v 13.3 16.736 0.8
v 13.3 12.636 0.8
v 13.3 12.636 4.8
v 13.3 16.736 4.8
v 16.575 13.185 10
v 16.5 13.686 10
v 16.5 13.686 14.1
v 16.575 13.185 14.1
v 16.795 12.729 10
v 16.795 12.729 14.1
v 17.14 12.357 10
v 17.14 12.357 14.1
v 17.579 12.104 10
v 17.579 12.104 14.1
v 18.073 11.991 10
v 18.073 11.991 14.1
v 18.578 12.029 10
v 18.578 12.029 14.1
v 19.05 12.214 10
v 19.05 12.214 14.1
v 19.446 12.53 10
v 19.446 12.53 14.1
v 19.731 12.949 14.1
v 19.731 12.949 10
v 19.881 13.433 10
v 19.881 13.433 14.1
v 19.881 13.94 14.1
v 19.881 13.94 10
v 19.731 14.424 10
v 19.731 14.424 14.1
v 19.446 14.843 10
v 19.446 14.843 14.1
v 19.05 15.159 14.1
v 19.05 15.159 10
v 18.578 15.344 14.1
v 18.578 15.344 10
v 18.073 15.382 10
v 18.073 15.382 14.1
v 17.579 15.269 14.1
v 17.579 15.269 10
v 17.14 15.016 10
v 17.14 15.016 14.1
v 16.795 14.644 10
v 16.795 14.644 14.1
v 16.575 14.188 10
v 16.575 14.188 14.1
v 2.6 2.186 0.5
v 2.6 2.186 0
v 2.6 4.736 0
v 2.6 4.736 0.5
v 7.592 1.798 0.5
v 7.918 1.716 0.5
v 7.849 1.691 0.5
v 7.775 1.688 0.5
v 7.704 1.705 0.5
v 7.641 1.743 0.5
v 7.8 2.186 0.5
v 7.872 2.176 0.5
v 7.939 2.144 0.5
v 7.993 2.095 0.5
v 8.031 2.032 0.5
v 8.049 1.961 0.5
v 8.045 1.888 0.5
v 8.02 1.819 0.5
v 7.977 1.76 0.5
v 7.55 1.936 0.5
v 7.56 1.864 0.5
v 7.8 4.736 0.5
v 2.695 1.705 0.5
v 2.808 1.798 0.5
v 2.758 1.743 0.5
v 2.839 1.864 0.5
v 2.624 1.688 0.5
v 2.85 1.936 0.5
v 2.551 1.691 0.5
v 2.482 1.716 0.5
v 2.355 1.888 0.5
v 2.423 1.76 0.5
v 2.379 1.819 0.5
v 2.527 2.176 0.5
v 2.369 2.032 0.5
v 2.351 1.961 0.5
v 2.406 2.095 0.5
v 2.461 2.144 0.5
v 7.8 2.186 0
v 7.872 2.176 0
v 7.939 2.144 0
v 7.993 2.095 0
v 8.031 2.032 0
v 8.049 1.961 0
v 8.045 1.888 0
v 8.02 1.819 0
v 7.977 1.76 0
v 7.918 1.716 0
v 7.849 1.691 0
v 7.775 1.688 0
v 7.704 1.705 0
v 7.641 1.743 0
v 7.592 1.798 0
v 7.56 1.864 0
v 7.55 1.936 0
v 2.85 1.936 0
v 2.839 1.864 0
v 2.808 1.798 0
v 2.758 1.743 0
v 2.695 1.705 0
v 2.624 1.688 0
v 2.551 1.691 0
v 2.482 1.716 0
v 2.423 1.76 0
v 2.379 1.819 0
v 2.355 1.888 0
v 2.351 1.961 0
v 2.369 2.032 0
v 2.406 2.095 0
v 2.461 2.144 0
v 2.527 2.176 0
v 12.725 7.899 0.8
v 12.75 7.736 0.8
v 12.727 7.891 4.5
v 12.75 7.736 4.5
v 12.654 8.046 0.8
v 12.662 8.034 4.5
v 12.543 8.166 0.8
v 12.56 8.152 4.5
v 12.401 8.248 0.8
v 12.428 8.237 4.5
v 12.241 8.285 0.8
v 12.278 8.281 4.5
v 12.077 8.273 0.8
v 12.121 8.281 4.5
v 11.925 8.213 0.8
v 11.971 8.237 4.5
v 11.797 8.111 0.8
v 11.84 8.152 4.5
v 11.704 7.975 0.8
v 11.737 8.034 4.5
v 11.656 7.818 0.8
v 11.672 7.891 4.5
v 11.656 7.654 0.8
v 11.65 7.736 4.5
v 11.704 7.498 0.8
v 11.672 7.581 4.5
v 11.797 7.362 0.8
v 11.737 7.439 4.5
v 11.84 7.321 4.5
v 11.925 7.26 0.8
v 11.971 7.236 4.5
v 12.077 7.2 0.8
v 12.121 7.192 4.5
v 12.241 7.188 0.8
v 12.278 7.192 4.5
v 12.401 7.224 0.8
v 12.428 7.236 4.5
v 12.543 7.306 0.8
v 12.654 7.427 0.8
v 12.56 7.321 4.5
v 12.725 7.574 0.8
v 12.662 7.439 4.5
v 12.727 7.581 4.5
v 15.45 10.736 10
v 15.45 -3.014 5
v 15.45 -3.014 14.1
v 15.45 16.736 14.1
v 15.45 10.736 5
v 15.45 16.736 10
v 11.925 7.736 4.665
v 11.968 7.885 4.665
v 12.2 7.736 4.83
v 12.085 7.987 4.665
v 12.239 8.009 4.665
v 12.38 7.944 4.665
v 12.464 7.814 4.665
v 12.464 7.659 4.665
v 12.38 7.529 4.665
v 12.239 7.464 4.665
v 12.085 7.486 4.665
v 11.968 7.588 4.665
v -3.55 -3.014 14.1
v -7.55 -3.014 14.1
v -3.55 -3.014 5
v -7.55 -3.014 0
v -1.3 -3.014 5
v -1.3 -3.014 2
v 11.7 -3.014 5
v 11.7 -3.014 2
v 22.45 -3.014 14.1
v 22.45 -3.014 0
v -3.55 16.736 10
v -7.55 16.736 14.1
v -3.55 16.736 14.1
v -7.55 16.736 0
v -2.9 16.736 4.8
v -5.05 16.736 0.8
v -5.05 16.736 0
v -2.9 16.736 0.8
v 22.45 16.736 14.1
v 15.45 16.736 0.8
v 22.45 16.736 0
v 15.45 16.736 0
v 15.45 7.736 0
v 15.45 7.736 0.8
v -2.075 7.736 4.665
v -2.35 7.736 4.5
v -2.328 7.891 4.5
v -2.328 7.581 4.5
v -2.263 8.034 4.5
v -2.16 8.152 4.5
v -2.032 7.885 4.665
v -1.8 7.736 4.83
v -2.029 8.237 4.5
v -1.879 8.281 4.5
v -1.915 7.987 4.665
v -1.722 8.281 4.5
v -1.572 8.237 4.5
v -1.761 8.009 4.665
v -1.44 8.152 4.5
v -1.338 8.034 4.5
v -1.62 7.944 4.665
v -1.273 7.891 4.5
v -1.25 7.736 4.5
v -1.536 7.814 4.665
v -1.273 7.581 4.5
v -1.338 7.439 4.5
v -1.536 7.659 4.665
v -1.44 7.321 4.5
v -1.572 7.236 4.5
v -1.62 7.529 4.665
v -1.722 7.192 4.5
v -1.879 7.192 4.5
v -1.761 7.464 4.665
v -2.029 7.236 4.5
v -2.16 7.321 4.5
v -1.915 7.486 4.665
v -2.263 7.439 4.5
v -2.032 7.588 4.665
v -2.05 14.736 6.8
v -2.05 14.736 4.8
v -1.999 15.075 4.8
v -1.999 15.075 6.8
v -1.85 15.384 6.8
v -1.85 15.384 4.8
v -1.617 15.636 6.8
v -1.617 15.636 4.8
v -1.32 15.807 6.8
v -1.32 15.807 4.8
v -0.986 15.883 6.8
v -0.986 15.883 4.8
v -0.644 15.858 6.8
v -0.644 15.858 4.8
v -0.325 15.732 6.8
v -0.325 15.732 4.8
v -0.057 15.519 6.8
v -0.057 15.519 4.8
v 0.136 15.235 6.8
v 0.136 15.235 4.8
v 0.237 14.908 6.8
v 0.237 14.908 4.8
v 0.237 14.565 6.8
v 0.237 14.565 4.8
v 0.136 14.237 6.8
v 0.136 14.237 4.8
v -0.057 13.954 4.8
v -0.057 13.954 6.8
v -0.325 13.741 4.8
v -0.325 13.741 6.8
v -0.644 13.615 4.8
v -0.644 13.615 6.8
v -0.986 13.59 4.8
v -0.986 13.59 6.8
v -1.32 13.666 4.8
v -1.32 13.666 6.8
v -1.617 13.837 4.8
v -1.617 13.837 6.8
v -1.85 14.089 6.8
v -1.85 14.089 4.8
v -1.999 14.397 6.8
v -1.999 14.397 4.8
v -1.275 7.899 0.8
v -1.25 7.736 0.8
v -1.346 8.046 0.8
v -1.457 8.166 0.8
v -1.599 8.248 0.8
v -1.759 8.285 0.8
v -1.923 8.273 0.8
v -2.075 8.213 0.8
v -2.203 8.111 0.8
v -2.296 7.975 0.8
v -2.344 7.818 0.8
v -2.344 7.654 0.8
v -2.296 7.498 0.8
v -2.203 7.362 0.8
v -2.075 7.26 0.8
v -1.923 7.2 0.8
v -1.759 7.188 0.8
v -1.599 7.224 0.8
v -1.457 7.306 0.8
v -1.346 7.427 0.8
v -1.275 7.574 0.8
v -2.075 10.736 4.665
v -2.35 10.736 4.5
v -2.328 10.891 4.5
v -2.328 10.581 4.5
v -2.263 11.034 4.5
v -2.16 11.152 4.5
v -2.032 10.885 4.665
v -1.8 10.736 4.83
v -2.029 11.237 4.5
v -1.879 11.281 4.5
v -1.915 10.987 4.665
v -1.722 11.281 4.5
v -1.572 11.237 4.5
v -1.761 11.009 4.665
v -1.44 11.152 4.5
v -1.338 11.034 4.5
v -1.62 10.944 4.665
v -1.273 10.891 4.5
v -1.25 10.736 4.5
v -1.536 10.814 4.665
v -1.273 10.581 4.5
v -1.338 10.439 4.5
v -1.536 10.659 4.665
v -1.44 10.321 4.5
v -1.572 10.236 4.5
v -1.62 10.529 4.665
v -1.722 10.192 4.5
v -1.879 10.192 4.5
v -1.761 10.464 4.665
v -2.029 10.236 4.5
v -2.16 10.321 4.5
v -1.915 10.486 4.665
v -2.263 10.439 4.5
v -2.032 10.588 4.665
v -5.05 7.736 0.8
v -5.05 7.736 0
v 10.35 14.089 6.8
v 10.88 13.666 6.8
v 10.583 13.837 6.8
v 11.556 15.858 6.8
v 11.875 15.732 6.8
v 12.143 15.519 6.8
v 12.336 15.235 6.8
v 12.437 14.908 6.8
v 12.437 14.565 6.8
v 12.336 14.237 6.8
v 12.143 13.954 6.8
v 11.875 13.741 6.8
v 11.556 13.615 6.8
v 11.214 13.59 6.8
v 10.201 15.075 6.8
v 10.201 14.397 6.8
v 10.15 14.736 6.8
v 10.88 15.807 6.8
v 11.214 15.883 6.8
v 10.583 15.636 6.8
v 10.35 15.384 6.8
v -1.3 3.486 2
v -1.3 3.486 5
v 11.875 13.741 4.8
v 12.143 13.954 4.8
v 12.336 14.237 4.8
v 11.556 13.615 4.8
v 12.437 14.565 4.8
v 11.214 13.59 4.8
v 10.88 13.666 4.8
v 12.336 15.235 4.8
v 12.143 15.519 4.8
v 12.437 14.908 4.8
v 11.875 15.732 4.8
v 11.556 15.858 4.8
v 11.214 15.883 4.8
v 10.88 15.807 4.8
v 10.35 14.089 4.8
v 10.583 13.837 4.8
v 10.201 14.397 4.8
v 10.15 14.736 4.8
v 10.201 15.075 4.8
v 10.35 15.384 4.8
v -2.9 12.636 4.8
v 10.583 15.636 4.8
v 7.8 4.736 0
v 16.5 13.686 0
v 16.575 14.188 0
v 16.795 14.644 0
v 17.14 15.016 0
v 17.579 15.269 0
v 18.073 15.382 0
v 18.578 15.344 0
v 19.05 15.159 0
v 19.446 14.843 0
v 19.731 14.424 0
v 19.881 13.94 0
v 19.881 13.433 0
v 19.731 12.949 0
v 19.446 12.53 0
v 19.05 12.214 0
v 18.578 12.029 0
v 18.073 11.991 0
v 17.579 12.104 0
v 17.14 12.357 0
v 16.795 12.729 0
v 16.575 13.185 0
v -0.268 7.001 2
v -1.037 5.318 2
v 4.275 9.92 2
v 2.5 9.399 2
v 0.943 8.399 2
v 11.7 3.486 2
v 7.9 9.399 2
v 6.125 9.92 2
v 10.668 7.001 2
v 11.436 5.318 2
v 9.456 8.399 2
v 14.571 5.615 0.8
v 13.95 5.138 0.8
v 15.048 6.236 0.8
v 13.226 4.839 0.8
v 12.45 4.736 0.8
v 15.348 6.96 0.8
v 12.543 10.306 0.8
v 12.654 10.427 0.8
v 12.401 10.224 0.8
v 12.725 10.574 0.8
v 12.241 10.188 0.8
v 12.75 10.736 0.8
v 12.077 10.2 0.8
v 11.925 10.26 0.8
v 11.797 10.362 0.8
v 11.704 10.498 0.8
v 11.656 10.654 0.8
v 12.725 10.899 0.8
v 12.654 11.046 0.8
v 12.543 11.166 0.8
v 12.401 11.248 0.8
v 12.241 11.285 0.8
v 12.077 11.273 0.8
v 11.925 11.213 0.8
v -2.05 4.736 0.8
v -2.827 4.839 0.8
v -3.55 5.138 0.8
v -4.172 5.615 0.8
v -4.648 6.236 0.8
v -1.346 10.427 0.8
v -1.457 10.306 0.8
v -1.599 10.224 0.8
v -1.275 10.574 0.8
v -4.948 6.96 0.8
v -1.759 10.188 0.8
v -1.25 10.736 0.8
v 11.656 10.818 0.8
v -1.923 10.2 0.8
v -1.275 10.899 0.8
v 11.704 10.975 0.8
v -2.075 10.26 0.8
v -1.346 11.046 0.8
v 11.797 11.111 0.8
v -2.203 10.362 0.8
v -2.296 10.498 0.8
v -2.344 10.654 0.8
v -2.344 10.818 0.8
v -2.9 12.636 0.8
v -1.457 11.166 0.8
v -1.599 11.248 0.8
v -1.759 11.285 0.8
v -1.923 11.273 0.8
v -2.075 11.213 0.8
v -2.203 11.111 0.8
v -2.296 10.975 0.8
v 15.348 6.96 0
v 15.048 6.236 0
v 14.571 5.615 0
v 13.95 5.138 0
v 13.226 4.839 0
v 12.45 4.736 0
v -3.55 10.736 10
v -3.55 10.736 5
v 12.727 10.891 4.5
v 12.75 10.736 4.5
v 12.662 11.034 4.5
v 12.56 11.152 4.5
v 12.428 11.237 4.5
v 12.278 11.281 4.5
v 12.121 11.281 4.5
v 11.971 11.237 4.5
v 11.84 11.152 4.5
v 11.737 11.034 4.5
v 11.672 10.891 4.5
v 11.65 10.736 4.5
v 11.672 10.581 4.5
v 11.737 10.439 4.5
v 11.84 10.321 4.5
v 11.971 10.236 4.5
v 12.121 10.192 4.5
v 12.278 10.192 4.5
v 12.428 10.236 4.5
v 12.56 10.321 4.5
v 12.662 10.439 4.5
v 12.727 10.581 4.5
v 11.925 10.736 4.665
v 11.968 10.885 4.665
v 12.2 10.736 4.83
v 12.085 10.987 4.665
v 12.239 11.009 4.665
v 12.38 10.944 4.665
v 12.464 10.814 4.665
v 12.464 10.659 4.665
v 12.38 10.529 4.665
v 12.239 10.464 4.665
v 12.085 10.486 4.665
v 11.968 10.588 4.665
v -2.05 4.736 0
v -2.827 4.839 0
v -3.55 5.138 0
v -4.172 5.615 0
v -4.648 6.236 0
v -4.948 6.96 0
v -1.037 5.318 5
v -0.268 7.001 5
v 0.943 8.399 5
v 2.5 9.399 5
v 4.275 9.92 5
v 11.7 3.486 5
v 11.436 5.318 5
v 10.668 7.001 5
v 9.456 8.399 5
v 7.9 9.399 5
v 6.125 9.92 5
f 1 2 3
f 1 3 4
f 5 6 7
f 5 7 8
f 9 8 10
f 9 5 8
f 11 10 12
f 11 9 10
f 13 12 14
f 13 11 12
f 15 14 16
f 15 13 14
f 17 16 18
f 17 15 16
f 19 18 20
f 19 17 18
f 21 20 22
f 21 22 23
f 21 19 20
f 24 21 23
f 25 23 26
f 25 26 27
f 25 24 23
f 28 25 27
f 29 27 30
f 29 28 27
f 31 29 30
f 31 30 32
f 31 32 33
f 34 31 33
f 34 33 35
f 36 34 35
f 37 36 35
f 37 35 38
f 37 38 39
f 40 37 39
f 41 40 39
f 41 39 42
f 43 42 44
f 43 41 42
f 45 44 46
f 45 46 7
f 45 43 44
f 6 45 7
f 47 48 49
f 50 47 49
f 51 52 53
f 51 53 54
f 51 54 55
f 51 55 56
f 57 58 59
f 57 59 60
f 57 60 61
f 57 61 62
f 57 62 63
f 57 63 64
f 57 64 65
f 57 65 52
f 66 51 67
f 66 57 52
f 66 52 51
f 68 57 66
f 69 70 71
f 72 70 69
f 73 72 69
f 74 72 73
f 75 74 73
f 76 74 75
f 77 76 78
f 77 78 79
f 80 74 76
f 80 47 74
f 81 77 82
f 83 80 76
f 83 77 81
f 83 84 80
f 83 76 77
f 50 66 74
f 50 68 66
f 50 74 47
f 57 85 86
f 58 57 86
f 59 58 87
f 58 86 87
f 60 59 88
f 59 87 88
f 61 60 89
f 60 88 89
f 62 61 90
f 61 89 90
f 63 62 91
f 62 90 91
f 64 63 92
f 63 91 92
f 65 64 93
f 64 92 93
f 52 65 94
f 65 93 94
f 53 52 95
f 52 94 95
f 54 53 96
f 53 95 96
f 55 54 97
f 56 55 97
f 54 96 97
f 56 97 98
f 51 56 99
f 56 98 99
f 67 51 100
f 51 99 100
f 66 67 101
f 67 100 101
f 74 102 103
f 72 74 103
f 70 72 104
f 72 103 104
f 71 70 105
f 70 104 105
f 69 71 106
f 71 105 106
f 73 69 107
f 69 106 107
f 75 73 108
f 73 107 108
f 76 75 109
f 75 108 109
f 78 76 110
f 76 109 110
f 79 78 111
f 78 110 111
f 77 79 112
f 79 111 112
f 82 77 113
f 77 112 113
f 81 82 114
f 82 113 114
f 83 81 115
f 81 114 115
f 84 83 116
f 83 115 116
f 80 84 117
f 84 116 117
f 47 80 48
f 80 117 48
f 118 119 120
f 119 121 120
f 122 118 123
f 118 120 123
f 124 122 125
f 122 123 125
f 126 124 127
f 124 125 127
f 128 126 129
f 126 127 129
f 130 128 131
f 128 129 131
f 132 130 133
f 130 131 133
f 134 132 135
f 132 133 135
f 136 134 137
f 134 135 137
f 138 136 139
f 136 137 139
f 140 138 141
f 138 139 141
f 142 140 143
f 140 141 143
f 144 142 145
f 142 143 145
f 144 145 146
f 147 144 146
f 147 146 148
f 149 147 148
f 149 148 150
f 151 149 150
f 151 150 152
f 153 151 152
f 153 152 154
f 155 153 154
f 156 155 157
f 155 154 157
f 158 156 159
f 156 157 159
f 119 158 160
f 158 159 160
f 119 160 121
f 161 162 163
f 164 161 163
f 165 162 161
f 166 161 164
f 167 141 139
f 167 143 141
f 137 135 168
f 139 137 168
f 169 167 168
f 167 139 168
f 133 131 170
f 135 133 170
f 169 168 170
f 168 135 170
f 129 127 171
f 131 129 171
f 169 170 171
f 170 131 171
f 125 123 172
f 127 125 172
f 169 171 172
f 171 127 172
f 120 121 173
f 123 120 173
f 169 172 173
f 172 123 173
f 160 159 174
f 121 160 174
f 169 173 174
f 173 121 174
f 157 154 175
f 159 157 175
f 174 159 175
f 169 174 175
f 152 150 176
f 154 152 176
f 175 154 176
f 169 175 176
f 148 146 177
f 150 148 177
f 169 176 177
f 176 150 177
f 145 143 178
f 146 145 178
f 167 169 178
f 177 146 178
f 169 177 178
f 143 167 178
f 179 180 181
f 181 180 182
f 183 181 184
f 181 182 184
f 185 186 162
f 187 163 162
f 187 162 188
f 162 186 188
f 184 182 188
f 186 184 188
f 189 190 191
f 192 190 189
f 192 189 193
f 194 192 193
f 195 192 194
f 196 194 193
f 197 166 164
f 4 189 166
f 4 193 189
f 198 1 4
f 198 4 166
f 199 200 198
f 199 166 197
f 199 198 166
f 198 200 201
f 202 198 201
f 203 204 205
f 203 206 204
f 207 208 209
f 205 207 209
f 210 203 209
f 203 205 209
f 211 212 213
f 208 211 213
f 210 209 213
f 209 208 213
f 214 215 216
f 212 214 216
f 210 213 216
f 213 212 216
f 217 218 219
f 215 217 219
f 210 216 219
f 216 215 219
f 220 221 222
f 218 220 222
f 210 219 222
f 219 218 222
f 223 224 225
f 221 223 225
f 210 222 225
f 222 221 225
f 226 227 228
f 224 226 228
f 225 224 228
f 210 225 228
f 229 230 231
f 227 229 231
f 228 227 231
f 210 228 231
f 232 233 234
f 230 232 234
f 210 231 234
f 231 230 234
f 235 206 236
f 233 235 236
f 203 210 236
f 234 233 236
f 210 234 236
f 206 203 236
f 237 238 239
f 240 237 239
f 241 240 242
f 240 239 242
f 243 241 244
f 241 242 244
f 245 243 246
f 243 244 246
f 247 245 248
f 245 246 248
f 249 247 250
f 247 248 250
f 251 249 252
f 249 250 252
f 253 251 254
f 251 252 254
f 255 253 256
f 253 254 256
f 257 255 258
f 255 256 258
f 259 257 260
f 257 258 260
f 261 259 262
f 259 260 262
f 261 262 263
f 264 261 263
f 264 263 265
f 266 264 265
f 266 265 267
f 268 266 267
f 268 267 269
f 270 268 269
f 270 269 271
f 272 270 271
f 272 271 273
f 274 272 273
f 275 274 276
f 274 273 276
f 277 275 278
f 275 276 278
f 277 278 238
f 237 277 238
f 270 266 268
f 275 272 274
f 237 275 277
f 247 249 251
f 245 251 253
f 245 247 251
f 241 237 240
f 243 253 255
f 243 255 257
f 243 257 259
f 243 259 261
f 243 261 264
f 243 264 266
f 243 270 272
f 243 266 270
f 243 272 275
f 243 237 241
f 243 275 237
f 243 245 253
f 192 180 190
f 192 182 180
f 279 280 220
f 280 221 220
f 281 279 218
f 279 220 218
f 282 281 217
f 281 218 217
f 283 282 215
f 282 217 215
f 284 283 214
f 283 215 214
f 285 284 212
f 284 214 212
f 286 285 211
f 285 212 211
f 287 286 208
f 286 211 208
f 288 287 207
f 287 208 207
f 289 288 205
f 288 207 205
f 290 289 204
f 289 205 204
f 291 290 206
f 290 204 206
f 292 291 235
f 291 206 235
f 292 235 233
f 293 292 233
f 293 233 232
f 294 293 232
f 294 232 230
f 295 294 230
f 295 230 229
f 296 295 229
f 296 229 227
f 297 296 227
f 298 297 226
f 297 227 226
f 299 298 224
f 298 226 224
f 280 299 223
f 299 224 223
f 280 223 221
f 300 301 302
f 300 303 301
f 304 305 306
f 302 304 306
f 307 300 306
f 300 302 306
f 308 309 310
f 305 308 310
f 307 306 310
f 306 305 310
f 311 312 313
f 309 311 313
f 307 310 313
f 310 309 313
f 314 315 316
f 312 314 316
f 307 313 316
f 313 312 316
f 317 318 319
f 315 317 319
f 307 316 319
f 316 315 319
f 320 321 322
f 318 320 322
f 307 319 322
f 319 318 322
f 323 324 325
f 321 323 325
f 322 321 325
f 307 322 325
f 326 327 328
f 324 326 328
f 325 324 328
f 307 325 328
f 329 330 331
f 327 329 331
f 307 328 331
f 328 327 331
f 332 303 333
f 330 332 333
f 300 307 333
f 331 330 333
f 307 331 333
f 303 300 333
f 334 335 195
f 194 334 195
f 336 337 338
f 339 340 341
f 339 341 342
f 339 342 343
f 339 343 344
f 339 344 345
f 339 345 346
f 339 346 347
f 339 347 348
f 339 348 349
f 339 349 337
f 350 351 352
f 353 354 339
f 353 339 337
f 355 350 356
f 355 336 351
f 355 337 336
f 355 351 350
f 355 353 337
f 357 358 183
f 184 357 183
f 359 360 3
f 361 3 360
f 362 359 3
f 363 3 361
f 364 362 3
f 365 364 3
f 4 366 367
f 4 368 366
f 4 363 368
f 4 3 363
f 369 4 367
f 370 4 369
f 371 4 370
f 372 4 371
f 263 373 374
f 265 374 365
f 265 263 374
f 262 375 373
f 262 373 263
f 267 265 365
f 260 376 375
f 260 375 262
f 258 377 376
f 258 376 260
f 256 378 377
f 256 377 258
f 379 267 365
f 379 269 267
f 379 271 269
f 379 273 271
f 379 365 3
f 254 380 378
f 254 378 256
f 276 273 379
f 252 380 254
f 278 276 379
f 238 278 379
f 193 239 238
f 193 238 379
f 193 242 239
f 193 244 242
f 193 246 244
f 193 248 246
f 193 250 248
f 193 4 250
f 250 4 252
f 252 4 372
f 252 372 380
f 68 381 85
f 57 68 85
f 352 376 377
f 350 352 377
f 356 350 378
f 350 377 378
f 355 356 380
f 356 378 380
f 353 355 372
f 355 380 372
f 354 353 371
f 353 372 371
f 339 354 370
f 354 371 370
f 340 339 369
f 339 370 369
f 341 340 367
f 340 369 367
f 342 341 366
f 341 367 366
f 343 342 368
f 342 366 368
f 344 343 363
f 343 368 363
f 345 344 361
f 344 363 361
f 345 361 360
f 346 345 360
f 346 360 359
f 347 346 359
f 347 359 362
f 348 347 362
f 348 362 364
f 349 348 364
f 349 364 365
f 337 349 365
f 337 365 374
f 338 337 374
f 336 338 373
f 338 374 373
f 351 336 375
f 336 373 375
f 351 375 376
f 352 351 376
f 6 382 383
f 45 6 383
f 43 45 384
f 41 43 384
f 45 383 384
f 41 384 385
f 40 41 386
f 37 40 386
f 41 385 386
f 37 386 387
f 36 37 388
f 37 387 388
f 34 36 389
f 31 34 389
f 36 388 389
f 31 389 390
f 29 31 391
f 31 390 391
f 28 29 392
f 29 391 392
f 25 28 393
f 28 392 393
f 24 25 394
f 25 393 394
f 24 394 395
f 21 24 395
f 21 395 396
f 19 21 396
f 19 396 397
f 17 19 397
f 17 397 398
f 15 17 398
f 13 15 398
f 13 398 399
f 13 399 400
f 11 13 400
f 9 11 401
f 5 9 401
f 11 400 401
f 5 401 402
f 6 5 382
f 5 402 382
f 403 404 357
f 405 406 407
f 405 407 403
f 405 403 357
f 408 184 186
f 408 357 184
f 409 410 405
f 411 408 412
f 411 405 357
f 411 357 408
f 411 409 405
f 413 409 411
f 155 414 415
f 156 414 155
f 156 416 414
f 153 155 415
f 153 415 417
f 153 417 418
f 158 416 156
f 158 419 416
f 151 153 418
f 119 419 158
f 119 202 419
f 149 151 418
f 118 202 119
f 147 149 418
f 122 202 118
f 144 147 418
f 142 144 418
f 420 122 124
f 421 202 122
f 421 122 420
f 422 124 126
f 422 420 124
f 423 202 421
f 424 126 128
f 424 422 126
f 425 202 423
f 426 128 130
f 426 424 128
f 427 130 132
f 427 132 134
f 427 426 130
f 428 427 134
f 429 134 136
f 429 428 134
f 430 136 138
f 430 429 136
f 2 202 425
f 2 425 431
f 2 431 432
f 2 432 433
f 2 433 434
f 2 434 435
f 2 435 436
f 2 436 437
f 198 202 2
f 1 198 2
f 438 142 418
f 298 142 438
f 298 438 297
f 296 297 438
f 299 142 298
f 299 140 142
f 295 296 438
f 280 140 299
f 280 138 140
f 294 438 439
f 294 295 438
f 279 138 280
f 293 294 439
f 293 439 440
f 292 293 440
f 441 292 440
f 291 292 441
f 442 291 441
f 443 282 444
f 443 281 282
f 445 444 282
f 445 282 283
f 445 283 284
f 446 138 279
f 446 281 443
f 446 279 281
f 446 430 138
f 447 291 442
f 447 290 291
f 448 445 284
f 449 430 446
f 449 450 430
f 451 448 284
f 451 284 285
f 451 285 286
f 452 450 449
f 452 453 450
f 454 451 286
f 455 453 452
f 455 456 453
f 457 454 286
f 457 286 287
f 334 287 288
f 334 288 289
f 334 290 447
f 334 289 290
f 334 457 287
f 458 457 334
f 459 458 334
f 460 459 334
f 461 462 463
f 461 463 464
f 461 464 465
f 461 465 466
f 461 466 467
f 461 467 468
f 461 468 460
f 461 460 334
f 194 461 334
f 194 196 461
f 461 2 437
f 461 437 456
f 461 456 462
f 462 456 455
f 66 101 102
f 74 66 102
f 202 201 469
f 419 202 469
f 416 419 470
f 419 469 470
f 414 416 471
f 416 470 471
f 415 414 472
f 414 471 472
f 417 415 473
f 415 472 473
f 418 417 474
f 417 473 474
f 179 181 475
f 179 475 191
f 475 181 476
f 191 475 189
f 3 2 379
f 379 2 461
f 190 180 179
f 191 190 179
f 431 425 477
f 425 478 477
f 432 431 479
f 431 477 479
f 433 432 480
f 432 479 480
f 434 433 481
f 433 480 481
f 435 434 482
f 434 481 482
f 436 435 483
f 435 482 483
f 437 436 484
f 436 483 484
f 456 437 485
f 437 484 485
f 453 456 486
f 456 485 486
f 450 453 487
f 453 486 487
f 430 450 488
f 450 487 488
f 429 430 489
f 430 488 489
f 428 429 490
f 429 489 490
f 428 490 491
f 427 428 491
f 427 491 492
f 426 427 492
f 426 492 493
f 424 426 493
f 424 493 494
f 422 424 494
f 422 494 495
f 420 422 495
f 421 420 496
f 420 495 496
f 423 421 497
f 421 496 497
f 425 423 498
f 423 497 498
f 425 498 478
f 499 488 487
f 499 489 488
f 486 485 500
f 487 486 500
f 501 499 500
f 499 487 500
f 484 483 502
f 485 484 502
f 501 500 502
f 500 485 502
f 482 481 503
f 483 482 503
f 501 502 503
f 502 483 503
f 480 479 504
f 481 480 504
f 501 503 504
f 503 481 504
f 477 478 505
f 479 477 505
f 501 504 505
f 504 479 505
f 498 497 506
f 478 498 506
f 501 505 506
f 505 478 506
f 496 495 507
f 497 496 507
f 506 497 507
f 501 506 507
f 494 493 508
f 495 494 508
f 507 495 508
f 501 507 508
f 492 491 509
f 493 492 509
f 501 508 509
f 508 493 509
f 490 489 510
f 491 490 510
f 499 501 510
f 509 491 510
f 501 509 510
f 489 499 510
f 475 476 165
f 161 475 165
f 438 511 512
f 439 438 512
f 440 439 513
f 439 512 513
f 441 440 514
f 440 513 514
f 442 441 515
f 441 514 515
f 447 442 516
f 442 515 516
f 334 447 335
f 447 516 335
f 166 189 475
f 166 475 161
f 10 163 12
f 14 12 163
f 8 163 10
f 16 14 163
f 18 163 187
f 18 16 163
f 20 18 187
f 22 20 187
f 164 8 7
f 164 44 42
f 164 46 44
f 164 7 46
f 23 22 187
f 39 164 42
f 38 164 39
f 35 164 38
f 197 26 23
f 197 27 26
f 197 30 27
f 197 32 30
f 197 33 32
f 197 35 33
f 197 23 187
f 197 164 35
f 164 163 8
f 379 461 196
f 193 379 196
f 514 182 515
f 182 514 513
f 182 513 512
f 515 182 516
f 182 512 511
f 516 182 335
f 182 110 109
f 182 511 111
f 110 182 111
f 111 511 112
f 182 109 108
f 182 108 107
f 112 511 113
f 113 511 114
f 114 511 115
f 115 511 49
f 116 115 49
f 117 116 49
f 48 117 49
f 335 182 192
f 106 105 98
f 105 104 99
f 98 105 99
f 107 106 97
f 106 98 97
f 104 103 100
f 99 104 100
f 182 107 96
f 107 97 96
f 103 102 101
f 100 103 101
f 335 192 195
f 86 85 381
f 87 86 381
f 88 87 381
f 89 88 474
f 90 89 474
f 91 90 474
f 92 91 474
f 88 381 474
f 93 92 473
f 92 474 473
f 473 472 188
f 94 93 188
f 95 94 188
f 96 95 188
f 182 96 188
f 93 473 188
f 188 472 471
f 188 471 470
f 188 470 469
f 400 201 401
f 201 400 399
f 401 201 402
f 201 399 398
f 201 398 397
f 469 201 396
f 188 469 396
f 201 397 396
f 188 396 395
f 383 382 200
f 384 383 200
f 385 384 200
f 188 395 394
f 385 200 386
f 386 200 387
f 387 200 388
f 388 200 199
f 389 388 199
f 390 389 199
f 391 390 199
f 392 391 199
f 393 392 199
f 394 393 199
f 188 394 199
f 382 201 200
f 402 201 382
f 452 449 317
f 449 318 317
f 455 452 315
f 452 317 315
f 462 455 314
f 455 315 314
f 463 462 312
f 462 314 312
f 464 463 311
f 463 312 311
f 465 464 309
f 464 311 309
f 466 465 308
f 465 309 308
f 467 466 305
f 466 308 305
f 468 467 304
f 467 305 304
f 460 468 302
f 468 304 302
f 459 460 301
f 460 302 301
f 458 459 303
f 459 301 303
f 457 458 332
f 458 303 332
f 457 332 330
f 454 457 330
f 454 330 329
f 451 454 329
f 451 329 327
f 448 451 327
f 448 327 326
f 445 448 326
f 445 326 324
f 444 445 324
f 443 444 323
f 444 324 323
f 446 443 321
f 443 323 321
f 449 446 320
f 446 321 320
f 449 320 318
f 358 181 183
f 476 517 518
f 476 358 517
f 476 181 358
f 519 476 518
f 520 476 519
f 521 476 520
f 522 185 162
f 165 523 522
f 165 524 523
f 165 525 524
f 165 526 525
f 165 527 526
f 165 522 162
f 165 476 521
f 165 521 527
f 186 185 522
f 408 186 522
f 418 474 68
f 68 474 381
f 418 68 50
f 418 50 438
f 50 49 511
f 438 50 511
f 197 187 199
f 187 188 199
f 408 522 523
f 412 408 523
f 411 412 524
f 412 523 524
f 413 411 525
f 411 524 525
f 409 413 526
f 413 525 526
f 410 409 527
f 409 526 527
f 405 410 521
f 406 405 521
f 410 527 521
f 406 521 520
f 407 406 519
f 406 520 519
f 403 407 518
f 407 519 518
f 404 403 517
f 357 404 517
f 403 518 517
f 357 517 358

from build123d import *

# Parameters (mm, degrees)
SKETCH_1_W           = 30
SKETCH_1_H           = 24
EXTRUDE_1_DEPTH      = 10
CUT_EXTRUDE_2_DEPTH  = 0.8
M1_4X0_3_2_D         = 1.1
M1_4X0_3_2_DEPTH     = 3.7
M1_4X0_3_2_TIP       = 0.33047334
CUT_EXTRUDE_4_DEPTH  = 0.5
SKETCH_12_W          = 30
SKETCH_12_H          = 4.25
CUT_EXTRUDE_5_DEPTH  = 10
SKETCH_13_R          = 1.7
CUT_EXTRUDE_6_DEPTH  = 10
SKETCH_14_W          = 23
SKETCH_14_H          = 19.75
CUT_EXTRUDE_7_DEPTH  = 5
CUT_EXTRUDE_9_DEPTH  = 3
SKETCH_20_W          = 7
SKETCH_20_H          = 19.75
SKETCH_20_R          = 1.7
EXTRUDE_3_DEPTH      = 4.1
SKETCH_23_W          = 4
SKETCH_23_H          = 19.75
EXTRUDE_4_DEPTH      = 9.1
SKETCH_24_W          = 16.2
SKETCH_24_H          = 4.1
CUT_EXTRUDE_10_DEPTH = 4
SKETCH_25_W          = 19
SKETCH_25_H          = 6
EXTRUDE_6_DEPTH      = 5
SKETCH_28_R          = 1.15
CUT_EXTRUDE_12_DEPTH = 2


with BuildPart() as part:
    # 草图1 → 凸台-拉伸1 (new body)
    with BuildSketch(Plane.XY):
        with Locations((7.449728974, 4.736434109)):
            Rectangle(SKETCH_1_W, SKETCH_1_H)
    extrude(amount=EXTRUDE_1_DEPTH)

    # 草图2 → 切除-拉伸2 (cut)
    with BuildSketch(Plane(origin=(0, 0, 0), x_dir=(-1, 0, 0), z_dir=(0, 0, -1))):
        with BuildLine():
            Line((5.050271026, 16.736434109), (-15.449728974, 16.736434109))
            Line((-15.449728974, 16.736434109), (-15.449728974, 7.736434109))
            ThreePointArc((-15.449728974, 7.736434109), (-14.571049317, 5.615113765), (-12.449728974, 4.736434109))
            Line((-12.449728974, 4.736434109), (2.050271026, 4.736434109))
            ThreePointArc((2.050271026, 4.736434109), (4.17159137, 5.615113765), (5.050271026, 7.736434109))
            Line((5.050271026, 7.736434109), (5.050271026, 16.736434109))
        make_face()
    extrude(amount=-CUT_EXTRUDE_2_DEPTH, mode=Mode.SUBTRACT)

    # M1.4x0.3 螺纹孔2
    with Locations(Plane(origin=(0, 0, 0.8), x_dir=(-1, 0, 0), z_dir=(0, 0, -1))):
        with Locations((-12.199728974, 10.736434109), (1.800271026, 10.736434109), (-12.199728974, 7.736434109), (1.800271026, 7.736434109)):
            Hole(M1_4X0_3_2_D / 2, depth=M1_4X0_3_2_DEPTH)
            with Locations((0, 0, -(M1_4X0_3_2_DEPTH + M1_4X0_3_2_TIP / 2))):  # 118° drill point
                Cone(0, M1_4X0_3_2_D / 2, M1_4X0_3_2_TIP, mode=Mode.SUBTRACT)

    # 草图11 → 切除-拉伸4 (cut)
    with BuildSketch(Plane(origin=(0, 0, 0), x_dir=(-1, 0, 0), z_dir=(0, 0, -1))):
        with BuildLine():
            Line((-7.549728974, 1.936434109), (-2.849728974, 1.936434109))
            ThreePointArc((-2.849728974, 1.936434109), (-2.422952278, 1.759657413), (-2.599728974, 2.186434109))
            Line((-2.599728974, 2.186434109), (-2.599728974, 4.736434109))
            Line((-2.599728974, 4.736434109), (-7.799728974, 4.736434109))
            Line((-7.799728974, 4.736434109), (-7.799728974, 2.186434109))
            ThreePointArc((-7.799728974, 2.186434109), (-7.976505669, 1.759657413), (-7.549728974, 1.936434109))
        make_face()
    extrude(amount=-CUT_EXTRUDE_4_DEPTH, mode=Mode.SUBTRACT)

    # 草图12 → 切除-拉伸5 (cut)
    with BuildSketch(Plane(origin=(0, 0, 0), x_dir=(-1, 0, 0), z_dir=(0, 0, -1))):
        with Locations((-7.449728974, -5.138565891)):
            Rectangle(SKETCH_12_W, SKETCH_12_H)
    extrude(amount=-CUT_EXTRUDE_5_DEPTH, mode=Mode.SUBTRACT)

    # 草图13 → 切除-拉伸6 (cut)
    with BuildSketch(Plane(origin=(0, 0, 0), x_dir=(-1, 0, 0), z_dir=(0, 0, -1))):
        with Locations((-18.199728974, 13.686434109)):
            Circle(SKETCH_13_R)
    extrude(amount=-CUT_EXTRUDE_6_DEPTH, mode=Mode.SUBTRACT)

    # 草图14 → 切除-拉伸7 (cut)
    with BuildSketch(Plane.XY.offset(10)):
        with Locations((3.949728974, 6.861434109)):
            Rectangle(SKETCH_14_W, SKETCH_14_H)
    extrude(amount=-CUT_EXTRUDE_7_DEPTH, mode=Mode.SUBTRACT)

    # 草图16 → 切除-拉伸9 (cut)
    with BuildSketch(Plane.XY.offset(5)):
        with BuildLine():
            Line((-1.300271026, -3.013565891), (11.699728974, -3.013565891))
            Line((11.699728974, -3.013565891), (11.699728974, 3.486434109))
            ThreePointArc((11.699728974, 3.486434109), (5.199728974, 9.986434109), (-1.300271026, 3.486434109))
            Line((-1.300271026, 3.486434109), (-1.300271026, -3.013565891))
        make_face()
    extrude(amount=-CUT_EXTRUDE_9_DEPTH, mode=Mode.SUBTRACT)

    # 草图20 → 凸台-拉伸3 (add)
    with BuildSketch(Plane.XY.offset(10)):
        with Locations((18.949728974, 6.861434109)):
            Rectangle(SKETCH_20_W, SKETCH_20_H)
        with Locations((18.199728974, 13.686434109)):
            Circle(SKETCH_20_R, mode=Mode.SUBTRACT)
    extrude(amount=EXTRUDE_3_DEPTH)

    # 草图23 → 凸台-拉伸4 (add)
    with BuildSketch(Plane.XY.offset(5)):
        with Locations((-5.550271026, 6.861434109)):
            Rectangle(SKETCH_23_W, SKETCH_23_H)
    extrude(amount=EXTRUDE_4_DEPTH)

    # 草图24 → 切除-拉伸10 (cut)
    with BuildSketch(Plane(origin=(0, 0, 0.8), x_dir=(-1, 0, 0), z_dir=(0, 0, -1))):
        with Locations((-5.199728974, 14.686434109)):
            Rectangle(SKETCH_24_W, SKETCH_24_H)
    extrude(amount=-CUT_EXTRUDE_10_DEPTH, mode=Mode.SUBTRACT)

    # 草图25 → 凸台-拉伸6 (add)
    with BuildSketch(Plane.XY.offset(5)):
        with Locations((5.949728974, 13.736434109)):
            Rectangle(SKETCH_25_W, SKETCH_25_H)
    extrude(amount=EXTRUDE_6_DEPTH)

    # 草图28 → 切除-拉伸12 (cut)
    with BuildSketch(Plane(origin=(0, 0, 4.8), x_dir=(-1, 0, 0), z_dir=(0, 0, -1))):
        with Locations((-11.299728974, 14.736434109)):
            Circle(SKETCH_28_R)
        with Locations((0.900271026, 14.736434109)):
            Circle(SKETCH_28_R)
    extrude(amount=-CUT_EXTRUDE_12_DEPTH, mode=Mode.SUBTRACT)


solid = part.part
